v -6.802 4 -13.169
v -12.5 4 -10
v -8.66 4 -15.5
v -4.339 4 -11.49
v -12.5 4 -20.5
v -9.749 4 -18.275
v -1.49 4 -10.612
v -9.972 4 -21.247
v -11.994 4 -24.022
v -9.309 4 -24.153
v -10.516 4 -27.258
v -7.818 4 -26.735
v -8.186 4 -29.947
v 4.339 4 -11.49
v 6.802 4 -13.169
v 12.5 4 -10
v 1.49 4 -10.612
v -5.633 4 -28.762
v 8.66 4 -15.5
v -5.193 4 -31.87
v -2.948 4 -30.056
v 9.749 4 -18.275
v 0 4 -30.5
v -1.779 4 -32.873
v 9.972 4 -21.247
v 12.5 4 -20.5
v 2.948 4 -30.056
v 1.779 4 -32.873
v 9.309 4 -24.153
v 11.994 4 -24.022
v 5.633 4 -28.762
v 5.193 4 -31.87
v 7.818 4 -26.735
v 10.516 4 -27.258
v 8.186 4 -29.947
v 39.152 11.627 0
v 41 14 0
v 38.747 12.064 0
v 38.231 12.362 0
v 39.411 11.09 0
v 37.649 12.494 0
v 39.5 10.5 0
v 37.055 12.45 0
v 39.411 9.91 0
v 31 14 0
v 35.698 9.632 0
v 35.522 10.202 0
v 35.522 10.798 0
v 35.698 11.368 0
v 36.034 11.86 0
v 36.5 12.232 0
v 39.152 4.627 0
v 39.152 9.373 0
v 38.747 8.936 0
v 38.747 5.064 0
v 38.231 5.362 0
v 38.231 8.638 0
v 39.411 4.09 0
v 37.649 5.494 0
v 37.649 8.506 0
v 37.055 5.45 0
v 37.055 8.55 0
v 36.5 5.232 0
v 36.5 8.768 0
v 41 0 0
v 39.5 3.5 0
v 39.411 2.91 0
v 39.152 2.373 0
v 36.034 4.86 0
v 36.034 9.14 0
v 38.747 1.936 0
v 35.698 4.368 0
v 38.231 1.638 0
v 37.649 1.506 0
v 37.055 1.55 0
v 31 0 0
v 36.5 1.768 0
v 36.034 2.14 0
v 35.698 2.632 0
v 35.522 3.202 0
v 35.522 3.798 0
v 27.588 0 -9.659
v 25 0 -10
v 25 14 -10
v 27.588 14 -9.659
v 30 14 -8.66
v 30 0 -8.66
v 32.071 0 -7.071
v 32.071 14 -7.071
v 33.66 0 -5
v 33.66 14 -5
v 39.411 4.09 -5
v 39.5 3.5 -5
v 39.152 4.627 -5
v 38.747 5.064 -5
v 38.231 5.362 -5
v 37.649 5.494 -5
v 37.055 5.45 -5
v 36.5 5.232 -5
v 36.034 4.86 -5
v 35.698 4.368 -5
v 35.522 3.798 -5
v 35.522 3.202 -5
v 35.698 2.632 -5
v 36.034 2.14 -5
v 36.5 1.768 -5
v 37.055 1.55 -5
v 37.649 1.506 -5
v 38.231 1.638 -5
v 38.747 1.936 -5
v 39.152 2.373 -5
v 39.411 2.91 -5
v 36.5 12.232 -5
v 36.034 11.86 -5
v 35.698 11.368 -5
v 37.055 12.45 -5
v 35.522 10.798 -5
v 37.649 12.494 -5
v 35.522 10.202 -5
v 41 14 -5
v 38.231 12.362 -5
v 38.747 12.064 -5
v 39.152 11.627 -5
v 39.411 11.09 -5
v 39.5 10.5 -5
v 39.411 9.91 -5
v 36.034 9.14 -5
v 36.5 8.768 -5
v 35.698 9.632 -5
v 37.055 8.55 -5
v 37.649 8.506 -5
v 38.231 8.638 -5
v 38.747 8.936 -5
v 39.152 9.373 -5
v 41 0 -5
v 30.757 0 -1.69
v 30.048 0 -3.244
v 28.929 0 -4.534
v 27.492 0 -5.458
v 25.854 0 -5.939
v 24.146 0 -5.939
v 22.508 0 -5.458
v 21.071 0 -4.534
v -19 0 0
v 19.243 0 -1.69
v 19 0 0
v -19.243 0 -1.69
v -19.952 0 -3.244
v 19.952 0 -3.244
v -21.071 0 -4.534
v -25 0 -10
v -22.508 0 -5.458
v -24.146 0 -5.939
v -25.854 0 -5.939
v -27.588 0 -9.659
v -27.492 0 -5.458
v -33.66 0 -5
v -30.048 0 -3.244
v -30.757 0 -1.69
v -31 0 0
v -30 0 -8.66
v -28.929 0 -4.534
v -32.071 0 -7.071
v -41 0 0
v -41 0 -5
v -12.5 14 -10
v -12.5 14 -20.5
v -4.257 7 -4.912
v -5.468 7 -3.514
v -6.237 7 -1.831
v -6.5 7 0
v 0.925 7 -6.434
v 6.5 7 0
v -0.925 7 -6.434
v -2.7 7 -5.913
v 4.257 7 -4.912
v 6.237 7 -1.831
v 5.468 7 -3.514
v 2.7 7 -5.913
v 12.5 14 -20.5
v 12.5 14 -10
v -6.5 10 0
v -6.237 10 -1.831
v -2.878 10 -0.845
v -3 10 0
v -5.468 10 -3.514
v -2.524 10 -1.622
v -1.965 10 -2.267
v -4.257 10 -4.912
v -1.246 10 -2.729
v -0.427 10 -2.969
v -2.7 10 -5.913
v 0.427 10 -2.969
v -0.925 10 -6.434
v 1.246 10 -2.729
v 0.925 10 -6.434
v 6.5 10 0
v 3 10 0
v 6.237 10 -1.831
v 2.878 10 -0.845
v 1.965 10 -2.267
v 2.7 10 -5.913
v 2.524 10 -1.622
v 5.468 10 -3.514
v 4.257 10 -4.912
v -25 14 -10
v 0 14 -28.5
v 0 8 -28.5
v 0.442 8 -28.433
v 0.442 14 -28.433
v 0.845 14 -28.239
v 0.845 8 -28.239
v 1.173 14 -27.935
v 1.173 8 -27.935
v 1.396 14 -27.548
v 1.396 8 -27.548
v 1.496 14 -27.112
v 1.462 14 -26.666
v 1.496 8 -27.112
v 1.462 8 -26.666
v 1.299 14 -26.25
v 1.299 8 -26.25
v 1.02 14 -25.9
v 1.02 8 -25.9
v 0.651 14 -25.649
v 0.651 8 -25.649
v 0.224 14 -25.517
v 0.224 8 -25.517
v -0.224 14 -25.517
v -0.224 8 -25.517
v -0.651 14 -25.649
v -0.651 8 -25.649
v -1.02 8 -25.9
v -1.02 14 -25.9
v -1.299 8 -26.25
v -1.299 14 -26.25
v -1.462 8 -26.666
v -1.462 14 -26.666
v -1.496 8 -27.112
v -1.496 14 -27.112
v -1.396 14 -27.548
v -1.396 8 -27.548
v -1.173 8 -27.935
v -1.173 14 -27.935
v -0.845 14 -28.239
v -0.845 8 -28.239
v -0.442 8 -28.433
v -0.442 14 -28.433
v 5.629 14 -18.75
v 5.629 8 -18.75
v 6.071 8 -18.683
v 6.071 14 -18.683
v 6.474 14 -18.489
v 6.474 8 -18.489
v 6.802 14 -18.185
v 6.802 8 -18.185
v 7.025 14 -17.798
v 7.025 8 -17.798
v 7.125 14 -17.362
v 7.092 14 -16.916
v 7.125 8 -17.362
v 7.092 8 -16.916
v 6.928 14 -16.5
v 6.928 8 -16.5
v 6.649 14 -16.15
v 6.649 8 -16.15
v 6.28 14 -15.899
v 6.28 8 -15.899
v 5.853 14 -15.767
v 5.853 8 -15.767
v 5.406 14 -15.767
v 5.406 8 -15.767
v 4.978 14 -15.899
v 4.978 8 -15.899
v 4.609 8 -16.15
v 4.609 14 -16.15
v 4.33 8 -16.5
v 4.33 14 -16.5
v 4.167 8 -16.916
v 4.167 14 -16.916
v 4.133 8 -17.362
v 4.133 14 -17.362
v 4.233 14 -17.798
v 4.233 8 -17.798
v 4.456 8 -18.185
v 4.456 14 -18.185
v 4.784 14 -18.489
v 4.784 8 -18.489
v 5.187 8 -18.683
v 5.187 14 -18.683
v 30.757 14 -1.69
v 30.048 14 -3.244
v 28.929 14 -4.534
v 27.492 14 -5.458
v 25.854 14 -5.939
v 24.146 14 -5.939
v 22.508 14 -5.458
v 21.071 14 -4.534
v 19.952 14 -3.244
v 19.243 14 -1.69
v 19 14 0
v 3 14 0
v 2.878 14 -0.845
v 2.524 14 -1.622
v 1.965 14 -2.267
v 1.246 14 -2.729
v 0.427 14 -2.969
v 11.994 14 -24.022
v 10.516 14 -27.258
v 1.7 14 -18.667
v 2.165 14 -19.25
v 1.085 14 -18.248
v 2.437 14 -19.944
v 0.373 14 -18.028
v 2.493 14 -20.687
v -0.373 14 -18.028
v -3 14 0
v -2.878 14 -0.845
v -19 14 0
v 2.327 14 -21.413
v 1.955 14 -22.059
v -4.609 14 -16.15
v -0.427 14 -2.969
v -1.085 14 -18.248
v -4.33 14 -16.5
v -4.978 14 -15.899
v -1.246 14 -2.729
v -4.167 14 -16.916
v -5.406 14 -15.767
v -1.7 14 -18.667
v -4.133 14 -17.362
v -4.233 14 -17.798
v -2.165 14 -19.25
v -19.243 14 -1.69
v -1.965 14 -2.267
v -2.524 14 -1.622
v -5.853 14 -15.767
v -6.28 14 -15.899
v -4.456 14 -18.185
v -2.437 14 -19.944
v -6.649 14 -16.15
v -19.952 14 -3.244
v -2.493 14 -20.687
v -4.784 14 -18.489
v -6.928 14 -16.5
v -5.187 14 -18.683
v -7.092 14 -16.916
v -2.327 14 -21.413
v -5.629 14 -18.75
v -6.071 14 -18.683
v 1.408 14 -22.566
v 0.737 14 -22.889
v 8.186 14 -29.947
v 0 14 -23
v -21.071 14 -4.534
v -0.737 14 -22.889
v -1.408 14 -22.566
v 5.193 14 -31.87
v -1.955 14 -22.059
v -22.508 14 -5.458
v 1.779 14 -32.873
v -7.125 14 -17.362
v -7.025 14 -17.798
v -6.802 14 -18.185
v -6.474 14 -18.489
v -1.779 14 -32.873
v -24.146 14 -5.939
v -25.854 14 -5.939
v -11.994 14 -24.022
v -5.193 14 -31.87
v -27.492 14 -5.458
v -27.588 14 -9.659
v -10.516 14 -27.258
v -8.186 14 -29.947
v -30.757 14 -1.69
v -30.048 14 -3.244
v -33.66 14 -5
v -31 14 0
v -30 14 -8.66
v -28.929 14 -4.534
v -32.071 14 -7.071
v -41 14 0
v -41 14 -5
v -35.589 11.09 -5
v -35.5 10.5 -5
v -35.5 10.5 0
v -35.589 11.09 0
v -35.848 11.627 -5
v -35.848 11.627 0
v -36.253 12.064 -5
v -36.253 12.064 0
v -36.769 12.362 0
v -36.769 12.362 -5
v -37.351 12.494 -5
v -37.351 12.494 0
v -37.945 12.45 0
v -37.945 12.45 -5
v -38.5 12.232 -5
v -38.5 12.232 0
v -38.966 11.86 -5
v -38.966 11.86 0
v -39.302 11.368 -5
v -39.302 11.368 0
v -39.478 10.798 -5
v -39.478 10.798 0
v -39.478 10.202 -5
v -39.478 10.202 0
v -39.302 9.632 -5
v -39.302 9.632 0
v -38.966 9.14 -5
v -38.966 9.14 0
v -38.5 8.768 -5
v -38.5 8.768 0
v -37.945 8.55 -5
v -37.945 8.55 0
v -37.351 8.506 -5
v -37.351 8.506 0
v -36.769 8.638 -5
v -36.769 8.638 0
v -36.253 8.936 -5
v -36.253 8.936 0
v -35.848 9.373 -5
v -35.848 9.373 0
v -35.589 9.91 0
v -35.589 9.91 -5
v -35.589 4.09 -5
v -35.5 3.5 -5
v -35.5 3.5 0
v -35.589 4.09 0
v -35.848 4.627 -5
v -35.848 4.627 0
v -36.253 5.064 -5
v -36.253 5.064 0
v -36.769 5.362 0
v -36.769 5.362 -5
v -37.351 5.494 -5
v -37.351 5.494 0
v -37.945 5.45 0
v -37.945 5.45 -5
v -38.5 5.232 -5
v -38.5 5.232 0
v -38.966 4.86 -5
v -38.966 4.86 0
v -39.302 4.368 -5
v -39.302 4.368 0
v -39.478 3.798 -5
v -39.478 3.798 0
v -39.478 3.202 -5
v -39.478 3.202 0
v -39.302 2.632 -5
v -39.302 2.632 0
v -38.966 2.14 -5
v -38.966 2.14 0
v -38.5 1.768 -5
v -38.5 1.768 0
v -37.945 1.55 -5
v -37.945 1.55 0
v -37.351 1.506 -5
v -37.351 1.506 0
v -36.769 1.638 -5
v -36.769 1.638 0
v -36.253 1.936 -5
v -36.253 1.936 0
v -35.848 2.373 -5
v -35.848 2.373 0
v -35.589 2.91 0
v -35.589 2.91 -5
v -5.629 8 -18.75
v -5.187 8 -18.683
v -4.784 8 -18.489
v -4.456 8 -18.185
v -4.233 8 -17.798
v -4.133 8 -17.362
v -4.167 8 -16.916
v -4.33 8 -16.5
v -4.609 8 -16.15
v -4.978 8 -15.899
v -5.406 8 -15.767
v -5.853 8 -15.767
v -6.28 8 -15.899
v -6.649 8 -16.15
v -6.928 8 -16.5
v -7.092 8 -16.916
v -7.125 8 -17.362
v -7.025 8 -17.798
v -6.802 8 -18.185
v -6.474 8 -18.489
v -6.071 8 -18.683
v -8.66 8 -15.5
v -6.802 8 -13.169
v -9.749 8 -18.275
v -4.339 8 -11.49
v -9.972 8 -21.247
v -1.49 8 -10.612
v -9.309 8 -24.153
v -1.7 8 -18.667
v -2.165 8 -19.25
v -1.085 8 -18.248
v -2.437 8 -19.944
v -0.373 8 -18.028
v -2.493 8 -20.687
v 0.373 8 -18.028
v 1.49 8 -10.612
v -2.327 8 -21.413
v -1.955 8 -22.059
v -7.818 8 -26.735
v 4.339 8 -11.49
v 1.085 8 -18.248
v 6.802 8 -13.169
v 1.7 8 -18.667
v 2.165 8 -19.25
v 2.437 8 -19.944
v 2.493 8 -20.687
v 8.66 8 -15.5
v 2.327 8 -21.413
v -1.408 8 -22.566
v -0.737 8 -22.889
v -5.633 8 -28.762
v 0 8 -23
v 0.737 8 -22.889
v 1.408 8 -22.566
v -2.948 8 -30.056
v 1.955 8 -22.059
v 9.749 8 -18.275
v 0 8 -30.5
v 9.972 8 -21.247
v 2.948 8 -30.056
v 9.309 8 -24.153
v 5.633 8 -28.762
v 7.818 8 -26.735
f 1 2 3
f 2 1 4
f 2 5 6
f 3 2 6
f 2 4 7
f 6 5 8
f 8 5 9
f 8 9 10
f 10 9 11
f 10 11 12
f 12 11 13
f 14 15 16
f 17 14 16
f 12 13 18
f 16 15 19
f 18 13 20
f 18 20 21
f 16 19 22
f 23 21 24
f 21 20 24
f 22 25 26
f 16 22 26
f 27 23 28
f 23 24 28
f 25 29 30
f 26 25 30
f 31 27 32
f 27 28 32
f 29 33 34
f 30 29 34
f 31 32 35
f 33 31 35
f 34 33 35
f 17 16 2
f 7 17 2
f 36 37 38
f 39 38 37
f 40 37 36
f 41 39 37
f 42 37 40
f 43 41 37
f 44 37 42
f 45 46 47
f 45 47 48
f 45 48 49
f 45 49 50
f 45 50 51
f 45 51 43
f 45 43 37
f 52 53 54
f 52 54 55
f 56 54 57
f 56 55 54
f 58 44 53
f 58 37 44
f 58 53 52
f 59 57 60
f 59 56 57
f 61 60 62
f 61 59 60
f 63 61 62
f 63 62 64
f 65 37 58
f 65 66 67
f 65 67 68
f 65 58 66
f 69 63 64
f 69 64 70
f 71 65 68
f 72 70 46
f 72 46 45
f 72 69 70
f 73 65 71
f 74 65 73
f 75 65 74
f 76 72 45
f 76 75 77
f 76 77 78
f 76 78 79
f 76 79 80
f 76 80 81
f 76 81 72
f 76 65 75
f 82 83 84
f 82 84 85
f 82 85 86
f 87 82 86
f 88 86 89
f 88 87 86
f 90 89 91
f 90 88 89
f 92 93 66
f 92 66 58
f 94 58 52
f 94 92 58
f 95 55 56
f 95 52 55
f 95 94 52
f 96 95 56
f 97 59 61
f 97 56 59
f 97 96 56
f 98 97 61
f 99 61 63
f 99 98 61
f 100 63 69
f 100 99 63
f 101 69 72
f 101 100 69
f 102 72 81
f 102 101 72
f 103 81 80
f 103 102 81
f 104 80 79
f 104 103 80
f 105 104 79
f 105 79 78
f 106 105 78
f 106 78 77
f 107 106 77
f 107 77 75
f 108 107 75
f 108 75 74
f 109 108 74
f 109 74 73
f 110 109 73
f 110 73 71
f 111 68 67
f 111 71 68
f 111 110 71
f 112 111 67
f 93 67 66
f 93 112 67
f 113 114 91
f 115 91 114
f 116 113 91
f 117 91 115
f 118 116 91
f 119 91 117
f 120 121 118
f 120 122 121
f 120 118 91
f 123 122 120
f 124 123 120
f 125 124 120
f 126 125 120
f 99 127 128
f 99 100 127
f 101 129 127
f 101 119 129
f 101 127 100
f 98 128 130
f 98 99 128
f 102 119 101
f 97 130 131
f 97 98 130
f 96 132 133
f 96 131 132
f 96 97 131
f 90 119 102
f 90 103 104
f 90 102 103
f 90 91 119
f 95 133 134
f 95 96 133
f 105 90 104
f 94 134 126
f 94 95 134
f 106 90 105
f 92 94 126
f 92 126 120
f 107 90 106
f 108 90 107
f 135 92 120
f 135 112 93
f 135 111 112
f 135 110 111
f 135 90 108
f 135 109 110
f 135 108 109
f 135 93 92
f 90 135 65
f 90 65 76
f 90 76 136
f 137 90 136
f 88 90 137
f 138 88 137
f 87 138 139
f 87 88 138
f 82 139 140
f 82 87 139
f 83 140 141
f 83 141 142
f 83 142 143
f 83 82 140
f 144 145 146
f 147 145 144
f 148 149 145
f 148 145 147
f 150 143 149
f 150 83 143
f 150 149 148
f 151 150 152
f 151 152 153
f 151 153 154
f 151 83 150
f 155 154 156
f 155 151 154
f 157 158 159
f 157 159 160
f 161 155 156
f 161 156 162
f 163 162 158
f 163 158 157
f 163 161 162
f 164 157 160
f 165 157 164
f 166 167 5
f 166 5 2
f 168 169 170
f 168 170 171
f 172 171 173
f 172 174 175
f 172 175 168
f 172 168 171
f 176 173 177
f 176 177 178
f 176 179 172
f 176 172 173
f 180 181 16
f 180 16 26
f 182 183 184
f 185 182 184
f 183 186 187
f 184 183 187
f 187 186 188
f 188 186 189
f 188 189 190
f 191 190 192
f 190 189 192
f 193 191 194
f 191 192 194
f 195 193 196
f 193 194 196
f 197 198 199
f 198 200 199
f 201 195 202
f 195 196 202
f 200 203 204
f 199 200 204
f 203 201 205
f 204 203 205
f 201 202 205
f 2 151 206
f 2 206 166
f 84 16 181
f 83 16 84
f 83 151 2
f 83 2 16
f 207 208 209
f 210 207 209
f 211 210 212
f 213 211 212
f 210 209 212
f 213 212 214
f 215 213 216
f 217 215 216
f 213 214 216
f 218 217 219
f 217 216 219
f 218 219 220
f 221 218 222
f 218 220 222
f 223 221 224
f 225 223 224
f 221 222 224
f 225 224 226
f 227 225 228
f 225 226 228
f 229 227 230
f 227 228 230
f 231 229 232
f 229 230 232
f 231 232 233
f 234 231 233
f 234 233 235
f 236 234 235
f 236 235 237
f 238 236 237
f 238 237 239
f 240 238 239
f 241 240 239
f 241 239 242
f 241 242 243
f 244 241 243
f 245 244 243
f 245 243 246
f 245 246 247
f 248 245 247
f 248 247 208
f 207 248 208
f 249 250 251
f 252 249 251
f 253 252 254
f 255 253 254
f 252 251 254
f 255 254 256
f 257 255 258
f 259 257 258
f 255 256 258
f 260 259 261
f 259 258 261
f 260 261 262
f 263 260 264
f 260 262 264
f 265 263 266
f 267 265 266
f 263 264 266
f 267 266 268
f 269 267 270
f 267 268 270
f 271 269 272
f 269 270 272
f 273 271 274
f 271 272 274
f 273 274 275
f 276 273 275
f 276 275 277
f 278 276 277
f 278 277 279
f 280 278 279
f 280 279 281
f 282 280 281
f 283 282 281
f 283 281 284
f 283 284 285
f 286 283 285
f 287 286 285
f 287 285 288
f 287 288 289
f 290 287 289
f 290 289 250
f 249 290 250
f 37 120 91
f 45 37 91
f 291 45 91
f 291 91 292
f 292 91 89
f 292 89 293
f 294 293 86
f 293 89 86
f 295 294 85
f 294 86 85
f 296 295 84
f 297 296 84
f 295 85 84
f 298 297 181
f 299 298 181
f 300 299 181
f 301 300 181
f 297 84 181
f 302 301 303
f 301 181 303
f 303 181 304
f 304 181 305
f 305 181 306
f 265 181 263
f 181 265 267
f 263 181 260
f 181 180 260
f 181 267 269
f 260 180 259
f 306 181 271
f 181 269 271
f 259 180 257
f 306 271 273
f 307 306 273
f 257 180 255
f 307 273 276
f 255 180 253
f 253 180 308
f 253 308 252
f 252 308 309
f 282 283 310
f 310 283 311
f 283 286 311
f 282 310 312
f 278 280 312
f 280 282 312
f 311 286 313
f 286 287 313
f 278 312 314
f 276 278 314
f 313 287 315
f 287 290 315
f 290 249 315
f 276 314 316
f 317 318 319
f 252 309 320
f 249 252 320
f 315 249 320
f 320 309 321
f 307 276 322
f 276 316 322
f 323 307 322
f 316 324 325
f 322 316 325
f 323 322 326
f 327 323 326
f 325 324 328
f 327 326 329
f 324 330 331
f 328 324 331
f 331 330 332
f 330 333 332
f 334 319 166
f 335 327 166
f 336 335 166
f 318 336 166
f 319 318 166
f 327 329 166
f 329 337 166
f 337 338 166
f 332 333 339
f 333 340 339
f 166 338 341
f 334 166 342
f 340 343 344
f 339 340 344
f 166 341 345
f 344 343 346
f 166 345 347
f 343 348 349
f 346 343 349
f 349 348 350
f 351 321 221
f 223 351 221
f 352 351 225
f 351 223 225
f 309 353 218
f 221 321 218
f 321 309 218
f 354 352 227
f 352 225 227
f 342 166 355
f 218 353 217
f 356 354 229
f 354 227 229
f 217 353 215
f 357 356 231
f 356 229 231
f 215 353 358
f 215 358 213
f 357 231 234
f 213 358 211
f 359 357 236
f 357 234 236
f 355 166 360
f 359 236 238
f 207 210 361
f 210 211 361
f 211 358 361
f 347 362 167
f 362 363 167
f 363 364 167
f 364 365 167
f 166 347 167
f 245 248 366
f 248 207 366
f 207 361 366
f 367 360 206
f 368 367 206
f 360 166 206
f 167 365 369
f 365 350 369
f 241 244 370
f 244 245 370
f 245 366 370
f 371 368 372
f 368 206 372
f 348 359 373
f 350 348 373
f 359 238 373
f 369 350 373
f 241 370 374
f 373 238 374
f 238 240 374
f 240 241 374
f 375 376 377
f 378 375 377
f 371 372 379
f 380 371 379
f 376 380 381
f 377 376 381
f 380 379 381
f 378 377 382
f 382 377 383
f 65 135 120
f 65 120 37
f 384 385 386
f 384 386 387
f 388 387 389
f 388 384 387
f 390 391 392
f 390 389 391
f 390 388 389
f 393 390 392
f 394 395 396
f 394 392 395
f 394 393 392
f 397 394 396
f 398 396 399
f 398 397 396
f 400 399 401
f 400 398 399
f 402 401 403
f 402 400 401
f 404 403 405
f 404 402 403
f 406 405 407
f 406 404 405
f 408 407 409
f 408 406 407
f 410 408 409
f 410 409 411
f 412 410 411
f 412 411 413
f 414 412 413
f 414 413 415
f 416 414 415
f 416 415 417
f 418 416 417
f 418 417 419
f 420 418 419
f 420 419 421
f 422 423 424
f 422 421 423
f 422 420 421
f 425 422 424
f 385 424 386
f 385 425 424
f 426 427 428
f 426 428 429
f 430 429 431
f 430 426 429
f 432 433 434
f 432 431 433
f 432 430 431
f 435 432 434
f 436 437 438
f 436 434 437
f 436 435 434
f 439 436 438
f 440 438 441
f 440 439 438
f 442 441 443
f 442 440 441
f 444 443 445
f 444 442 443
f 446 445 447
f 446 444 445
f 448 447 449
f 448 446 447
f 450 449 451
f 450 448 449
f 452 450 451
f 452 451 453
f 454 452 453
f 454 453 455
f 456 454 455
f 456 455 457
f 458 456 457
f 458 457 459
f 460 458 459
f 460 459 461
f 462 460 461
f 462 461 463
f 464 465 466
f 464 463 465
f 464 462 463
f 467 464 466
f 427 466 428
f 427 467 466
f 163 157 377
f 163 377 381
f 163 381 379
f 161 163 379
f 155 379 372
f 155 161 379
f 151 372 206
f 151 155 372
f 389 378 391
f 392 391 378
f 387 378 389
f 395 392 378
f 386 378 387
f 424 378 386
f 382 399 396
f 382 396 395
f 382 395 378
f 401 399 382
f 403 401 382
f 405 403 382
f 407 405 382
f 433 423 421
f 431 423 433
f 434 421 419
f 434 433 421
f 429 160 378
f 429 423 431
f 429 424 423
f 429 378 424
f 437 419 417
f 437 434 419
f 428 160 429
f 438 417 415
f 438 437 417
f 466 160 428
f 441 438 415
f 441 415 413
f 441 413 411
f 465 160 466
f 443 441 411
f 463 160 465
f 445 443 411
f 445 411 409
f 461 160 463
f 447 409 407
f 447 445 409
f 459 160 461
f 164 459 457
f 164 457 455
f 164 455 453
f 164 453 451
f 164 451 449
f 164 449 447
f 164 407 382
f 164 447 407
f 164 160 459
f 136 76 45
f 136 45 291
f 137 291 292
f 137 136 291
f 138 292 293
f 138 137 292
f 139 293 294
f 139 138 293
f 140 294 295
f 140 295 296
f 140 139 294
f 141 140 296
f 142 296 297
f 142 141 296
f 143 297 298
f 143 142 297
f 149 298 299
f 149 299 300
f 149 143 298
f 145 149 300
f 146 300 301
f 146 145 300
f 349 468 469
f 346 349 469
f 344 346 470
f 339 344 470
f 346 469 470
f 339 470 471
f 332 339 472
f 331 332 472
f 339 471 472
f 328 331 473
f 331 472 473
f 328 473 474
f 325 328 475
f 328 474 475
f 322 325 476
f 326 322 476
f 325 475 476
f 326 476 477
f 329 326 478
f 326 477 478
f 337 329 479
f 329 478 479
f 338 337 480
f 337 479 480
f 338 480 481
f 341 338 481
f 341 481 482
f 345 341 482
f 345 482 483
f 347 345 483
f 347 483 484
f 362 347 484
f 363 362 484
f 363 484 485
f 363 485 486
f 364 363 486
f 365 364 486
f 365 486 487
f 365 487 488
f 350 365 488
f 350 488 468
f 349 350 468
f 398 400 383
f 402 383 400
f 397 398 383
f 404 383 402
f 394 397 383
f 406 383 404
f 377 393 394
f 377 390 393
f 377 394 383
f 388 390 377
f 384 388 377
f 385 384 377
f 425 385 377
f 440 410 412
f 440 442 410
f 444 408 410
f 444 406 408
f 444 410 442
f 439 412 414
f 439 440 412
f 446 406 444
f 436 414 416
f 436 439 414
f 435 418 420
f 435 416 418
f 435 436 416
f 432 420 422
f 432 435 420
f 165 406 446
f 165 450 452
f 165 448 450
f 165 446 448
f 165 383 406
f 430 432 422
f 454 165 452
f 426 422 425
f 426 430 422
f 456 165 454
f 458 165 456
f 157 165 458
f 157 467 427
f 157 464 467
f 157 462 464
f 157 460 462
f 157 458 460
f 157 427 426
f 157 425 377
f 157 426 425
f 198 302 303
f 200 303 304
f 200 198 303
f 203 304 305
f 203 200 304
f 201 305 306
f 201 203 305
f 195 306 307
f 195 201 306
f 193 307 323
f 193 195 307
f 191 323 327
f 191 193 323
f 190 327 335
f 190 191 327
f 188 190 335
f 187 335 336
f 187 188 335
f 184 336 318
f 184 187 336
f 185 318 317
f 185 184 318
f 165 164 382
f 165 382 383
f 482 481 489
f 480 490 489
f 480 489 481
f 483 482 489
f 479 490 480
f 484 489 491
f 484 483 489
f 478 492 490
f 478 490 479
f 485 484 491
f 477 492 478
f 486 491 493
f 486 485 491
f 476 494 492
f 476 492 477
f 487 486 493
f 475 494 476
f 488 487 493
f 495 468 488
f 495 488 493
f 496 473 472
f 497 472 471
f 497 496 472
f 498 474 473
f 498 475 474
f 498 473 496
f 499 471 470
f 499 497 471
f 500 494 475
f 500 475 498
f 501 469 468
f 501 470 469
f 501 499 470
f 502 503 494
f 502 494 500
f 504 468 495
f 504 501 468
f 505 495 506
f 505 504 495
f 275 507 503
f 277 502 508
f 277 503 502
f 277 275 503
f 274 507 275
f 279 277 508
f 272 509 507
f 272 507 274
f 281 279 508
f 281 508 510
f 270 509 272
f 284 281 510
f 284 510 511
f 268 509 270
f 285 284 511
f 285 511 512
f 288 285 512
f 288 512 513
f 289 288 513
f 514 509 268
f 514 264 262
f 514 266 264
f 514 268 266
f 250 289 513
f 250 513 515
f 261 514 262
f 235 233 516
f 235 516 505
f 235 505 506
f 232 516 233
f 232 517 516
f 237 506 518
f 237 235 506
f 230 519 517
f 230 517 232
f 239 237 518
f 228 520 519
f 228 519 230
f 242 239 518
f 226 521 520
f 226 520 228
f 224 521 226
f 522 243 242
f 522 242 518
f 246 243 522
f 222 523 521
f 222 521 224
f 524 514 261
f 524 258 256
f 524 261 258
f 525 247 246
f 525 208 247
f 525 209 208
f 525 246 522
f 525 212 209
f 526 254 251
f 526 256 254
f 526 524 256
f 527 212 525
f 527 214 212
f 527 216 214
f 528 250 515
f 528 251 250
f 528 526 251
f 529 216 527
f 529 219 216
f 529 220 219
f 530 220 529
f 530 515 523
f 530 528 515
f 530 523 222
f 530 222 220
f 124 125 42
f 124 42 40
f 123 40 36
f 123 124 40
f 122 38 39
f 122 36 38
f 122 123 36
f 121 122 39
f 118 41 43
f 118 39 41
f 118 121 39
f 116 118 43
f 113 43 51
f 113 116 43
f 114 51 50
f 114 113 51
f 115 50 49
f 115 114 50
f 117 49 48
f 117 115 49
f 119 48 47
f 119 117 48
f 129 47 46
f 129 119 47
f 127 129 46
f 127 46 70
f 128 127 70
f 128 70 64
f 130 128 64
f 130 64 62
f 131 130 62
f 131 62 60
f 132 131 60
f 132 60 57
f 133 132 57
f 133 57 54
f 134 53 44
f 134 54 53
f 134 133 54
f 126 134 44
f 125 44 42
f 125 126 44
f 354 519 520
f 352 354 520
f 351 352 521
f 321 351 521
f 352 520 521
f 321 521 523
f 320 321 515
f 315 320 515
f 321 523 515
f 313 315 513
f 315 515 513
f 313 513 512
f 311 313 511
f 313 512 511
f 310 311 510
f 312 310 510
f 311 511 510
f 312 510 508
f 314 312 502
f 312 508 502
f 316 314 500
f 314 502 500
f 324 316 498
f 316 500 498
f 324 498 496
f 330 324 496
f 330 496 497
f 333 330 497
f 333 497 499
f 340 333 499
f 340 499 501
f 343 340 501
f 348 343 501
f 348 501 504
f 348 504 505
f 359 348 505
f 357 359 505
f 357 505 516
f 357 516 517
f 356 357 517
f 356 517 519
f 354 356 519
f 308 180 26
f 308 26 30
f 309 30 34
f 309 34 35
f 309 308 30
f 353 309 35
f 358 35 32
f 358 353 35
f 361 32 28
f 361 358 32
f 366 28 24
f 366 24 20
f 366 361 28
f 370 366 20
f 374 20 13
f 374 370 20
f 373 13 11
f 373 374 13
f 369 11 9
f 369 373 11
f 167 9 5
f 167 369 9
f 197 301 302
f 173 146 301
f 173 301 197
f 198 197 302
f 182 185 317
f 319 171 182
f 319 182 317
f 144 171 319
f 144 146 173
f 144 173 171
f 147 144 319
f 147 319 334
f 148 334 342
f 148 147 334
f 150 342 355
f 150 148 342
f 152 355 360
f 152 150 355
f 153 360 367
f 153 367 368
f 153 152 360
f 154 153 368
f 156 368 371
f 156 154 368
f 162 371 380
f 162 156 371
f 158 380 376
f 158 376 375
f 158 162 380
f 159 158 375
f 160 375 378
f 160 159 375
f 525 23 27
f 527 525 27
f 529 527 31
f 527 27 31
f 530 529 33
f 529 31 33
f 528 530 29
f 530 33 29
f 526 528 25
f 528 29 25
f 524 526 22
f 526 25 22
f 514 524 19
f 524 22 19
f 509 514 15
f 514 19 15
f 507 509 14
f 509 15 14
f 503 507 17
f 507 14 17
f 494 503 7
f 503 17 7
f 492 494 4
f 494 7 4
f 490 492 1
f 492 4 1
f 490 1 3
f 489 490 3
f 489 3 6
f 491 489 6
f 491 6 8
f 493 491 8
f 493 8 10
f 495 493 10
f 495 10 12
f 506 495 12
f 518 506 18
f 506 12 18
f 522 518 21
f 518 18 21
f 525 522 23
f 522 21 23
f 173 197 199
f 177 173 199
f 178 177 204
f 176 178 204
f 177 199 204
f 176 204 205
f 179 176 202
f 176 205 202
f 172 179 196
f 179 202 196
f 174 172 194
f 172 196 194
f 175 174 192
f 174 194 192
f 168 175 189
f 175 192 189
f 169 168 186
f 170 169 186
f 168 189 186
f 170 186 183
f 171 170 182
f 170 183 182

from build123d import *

# Parameters (mm, degrees)
BOSS_EXTRUDE1_DEPTH     = 14
CUT_EXTRUDE1_DEPTH      = 45.463468151
CUT_EXTRUDE1_DEPTH_BACK = 45.463468151
SKETCH4_R               = 2
SKETCH5_W               = 9.30871577
SKETCH5_H               = 4.044371358
BOSS_EXTRUDE2_DEPTH     = 7
CUT_EXTRUDE2_START      = 1.5
SKETCH6_R               = 6.5
CUT_EXTRUDE2_DEPTH      = 1.5
BOSS_EXTRUDE3_DEPTH     = 10
SKETCH8_R               = 10
CUT_EXTRUDE3_DEPTH      = 4
SKETCH9_R               = 2.5
CUT_EXTRUDE4_DEPTH      = 54.235326617
SKETCH10_R              = 1.5
CUT_EXTRUDE5_DEPTH      = 54.235326617


with BuildPart() as part:
    # Sketch2 → Boss-Extrude1 (new body)
    with BuildSketch(Plane(origin=(0, 0, 0), x_dir=(1, 0, 0), z_dir=(0, 1, 0))):
        with BuildLine():
            Line((-3, 0), (-19, 0))
            ThreePointArc((-19, 0), (-25, 6), (-31, 0))
            Line((-31, 0), (-41, 0))
            Line((-41, 0), (-41, 5))
            Line((-41, 5), (-33.660254038, 5))
            ThreePointArc((-33.660254038, 5), (-30, 8.660254038), (-25, 10))
            Line((-25, 10), (25, 10))
            ThreePointArc((25, 10), (30, 8.660254038), (33.660254038, 5))
            Line((33.660254038, 5), (41, 5))
            Line((41, 5), (41, 0))
            Line((41, 0), (31, 0))
            ThreePointArc((31, 0), (25, 6), (19, 0))
            Line((19, 0), (3, 0))
            ThreePointArc((3, 0), (0, 3), (-3, 0))
        make_face()
    extrude(amount=BOSS_EXTRUDE1_DEPTH)

    # Sketch4 → Cut-Extrude1 (cut, two sides: drawn at the far end of the back side and taken through both)
    with BuildSketch(Plane.XY.offset(-CUT_EXTRUDE1_DEPTH_BACK)):
        with Locations((-37.5, 10.5)):
            Circle(SKETCH4_R)
        with Locations((-37.5, 3.5)):
            Circle(SKETCH4_R)
        with Locations((37.5, 10.5)):
            Circle(SKETCH4_R)
        with Locations((37.5, 3.5)):
            Circle(SKETCH4_R)
    extrude(amount=CUT_EXTRUDE1_DEPTH + CUT_EXTRUDE1_DEPTH_BACK, mode=Mode.SUBTRACT)

    # Sketch5 → Boss-Extrude2 (add)
    with BuildSketch(Plane.XZ):
        with Locations((-0.028958253, -2.022185679)):
            Rectangle(SKETCH5_W, SKETCH5_H)
    extrude(amount=-BOSS_EXTRUDE2_DEPTH)

    # Sketch6 → Cut-Extrude2 (cut, symmetric)
    with BuildSketch(Plane(origin=(0, 7, 0), x_dir=(1, 0, 0), z_dir=(0, 1, 0)).offset(CUT_EXTRUDE2_START)):
        Circle(SKETCH6_R)
    extrude(amount=CUT_EXTRUDE2_DEPTH, both=True, mode=Mode.SUBTRACT)

    # Sketch7 → Boss-Extrude3 (add)
    with BuildSketch(Plane(origin=(0, 14, 0), x_dir=(1, 0, 0), z_dir=(0, 1, 0))):
        with BuildLine():
            Line((-12.5, 20.5), (-12.5, 10))
            Line((-12.5, 10), (12.5, 10))
            Line((12.5, 10), (12.5, 20.5))
            ThreePointArc((12.5, 20.5), (0, 33), (-12.5, 20.5))
        make_face()
    extrude(amount=-BOSS_EXTRUDE3_DEPTH)

    # Sketch8 → Cut-Extrude3 (cut)
    with BuildSketch(Plane.XZ.offset(-4)):
        with Locations(Location((0, -20.5, 0), (0, 0, 270))):
            Circle(SKETCH8_R)
    extrude(amount=-CUT_EXTRUDE3_DEPTH, mode=Mode.SUBTRACT)

    # Sketch9 → Cut-Extrude4 (cut, through all)
    with BuildSketch(Plane.XZ.offset(-8)):
        with Locations(Location((0, -20.5, 0), (0, 0, 270))):
            Circle(SKETCH9_R)
    extrude(amount=-CUT_EXTRUDE4_DEPTH, mode=Mode.SUBTRACT)

    # Sketch10 → Cut-Extrude5 (cut, through all)
    with BuildSketch(Plane.XZ.offset(-8)):
        with Locations(Location((0, -27, 0), (0, 0, 270))):
            Circle(SKETCH10_R)
        with Locations(Location((-5.629165125, -17.25, 0), (0, 0, 270))):
            Circle(SKETCH10_R)
        with Locations(Location((5.629165125, -17.25, 0), (0, 0, 270))):
            Circle(SKETCH10_R)
    extrude(amount=-CUT_EXTRUDE5_DEPTH, mode=Mode.SUBTRACT)


solid = part.part
